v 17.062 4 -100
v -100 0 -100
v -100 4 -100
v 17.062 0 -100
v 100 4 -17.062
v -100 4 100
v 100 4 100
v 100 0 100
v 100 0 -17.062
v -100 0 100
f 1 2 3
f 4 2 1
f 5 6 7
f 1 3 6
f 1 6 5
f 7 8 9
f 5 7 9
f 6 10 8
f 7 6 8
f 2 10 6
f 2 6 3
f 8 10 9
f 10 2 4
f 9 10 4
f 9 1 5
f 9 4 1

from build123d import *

# Parameters (mm, degrees)
SKETCH1_W               = 200
SKETCH1_H               = 200
BOSS_EXTRUDE1_DEPTH     = 4
CUT_EXTRUDE1_DEPTH      = 142.477913471
CUT_EXTRUDE1_DEPTH_BACK = 142.477913471


with BuildPart() as part:
    # Sketch1 → Boss-Extrude1 (new body)
    with BuildSketch(Plane(origin=(0, 0, 0), x_dir=(1, 0, 0), z_dir=(0, 1, 0))):
        Rectangle(SKETCH1_W, SKETCH1_H)
    extrude(amount=BOSS_EXTRUDE1_DEPTH)

    # Sketch2 → Cut-Extrude1 (cut, two sides: drawn at the far end of the back side and taken through both)
    with BuildSketch(Plane(origin=(0, 4, 0), x_dir=(1, 0, 0), z_dir=(0, 1, 0)).offset(-CUT_EXTRUDE1_DEPTH_BACK)):
        Polygon((726.729261237, -609.667248673), (207.718866814, -90.656854249), (-90.656854249, 207.718866814), (-609.667248673, 726.729261237), (428.353540174, 1764.750050084), (1764.750050084, 428.353540174), align=None)
    extrude(amount=CUT_EXTRUDE1_DEPTH + CUT_EXTRUDE1_DEPTH_BACK, mode=Mode.SUBTRACT)


solid = part.part
